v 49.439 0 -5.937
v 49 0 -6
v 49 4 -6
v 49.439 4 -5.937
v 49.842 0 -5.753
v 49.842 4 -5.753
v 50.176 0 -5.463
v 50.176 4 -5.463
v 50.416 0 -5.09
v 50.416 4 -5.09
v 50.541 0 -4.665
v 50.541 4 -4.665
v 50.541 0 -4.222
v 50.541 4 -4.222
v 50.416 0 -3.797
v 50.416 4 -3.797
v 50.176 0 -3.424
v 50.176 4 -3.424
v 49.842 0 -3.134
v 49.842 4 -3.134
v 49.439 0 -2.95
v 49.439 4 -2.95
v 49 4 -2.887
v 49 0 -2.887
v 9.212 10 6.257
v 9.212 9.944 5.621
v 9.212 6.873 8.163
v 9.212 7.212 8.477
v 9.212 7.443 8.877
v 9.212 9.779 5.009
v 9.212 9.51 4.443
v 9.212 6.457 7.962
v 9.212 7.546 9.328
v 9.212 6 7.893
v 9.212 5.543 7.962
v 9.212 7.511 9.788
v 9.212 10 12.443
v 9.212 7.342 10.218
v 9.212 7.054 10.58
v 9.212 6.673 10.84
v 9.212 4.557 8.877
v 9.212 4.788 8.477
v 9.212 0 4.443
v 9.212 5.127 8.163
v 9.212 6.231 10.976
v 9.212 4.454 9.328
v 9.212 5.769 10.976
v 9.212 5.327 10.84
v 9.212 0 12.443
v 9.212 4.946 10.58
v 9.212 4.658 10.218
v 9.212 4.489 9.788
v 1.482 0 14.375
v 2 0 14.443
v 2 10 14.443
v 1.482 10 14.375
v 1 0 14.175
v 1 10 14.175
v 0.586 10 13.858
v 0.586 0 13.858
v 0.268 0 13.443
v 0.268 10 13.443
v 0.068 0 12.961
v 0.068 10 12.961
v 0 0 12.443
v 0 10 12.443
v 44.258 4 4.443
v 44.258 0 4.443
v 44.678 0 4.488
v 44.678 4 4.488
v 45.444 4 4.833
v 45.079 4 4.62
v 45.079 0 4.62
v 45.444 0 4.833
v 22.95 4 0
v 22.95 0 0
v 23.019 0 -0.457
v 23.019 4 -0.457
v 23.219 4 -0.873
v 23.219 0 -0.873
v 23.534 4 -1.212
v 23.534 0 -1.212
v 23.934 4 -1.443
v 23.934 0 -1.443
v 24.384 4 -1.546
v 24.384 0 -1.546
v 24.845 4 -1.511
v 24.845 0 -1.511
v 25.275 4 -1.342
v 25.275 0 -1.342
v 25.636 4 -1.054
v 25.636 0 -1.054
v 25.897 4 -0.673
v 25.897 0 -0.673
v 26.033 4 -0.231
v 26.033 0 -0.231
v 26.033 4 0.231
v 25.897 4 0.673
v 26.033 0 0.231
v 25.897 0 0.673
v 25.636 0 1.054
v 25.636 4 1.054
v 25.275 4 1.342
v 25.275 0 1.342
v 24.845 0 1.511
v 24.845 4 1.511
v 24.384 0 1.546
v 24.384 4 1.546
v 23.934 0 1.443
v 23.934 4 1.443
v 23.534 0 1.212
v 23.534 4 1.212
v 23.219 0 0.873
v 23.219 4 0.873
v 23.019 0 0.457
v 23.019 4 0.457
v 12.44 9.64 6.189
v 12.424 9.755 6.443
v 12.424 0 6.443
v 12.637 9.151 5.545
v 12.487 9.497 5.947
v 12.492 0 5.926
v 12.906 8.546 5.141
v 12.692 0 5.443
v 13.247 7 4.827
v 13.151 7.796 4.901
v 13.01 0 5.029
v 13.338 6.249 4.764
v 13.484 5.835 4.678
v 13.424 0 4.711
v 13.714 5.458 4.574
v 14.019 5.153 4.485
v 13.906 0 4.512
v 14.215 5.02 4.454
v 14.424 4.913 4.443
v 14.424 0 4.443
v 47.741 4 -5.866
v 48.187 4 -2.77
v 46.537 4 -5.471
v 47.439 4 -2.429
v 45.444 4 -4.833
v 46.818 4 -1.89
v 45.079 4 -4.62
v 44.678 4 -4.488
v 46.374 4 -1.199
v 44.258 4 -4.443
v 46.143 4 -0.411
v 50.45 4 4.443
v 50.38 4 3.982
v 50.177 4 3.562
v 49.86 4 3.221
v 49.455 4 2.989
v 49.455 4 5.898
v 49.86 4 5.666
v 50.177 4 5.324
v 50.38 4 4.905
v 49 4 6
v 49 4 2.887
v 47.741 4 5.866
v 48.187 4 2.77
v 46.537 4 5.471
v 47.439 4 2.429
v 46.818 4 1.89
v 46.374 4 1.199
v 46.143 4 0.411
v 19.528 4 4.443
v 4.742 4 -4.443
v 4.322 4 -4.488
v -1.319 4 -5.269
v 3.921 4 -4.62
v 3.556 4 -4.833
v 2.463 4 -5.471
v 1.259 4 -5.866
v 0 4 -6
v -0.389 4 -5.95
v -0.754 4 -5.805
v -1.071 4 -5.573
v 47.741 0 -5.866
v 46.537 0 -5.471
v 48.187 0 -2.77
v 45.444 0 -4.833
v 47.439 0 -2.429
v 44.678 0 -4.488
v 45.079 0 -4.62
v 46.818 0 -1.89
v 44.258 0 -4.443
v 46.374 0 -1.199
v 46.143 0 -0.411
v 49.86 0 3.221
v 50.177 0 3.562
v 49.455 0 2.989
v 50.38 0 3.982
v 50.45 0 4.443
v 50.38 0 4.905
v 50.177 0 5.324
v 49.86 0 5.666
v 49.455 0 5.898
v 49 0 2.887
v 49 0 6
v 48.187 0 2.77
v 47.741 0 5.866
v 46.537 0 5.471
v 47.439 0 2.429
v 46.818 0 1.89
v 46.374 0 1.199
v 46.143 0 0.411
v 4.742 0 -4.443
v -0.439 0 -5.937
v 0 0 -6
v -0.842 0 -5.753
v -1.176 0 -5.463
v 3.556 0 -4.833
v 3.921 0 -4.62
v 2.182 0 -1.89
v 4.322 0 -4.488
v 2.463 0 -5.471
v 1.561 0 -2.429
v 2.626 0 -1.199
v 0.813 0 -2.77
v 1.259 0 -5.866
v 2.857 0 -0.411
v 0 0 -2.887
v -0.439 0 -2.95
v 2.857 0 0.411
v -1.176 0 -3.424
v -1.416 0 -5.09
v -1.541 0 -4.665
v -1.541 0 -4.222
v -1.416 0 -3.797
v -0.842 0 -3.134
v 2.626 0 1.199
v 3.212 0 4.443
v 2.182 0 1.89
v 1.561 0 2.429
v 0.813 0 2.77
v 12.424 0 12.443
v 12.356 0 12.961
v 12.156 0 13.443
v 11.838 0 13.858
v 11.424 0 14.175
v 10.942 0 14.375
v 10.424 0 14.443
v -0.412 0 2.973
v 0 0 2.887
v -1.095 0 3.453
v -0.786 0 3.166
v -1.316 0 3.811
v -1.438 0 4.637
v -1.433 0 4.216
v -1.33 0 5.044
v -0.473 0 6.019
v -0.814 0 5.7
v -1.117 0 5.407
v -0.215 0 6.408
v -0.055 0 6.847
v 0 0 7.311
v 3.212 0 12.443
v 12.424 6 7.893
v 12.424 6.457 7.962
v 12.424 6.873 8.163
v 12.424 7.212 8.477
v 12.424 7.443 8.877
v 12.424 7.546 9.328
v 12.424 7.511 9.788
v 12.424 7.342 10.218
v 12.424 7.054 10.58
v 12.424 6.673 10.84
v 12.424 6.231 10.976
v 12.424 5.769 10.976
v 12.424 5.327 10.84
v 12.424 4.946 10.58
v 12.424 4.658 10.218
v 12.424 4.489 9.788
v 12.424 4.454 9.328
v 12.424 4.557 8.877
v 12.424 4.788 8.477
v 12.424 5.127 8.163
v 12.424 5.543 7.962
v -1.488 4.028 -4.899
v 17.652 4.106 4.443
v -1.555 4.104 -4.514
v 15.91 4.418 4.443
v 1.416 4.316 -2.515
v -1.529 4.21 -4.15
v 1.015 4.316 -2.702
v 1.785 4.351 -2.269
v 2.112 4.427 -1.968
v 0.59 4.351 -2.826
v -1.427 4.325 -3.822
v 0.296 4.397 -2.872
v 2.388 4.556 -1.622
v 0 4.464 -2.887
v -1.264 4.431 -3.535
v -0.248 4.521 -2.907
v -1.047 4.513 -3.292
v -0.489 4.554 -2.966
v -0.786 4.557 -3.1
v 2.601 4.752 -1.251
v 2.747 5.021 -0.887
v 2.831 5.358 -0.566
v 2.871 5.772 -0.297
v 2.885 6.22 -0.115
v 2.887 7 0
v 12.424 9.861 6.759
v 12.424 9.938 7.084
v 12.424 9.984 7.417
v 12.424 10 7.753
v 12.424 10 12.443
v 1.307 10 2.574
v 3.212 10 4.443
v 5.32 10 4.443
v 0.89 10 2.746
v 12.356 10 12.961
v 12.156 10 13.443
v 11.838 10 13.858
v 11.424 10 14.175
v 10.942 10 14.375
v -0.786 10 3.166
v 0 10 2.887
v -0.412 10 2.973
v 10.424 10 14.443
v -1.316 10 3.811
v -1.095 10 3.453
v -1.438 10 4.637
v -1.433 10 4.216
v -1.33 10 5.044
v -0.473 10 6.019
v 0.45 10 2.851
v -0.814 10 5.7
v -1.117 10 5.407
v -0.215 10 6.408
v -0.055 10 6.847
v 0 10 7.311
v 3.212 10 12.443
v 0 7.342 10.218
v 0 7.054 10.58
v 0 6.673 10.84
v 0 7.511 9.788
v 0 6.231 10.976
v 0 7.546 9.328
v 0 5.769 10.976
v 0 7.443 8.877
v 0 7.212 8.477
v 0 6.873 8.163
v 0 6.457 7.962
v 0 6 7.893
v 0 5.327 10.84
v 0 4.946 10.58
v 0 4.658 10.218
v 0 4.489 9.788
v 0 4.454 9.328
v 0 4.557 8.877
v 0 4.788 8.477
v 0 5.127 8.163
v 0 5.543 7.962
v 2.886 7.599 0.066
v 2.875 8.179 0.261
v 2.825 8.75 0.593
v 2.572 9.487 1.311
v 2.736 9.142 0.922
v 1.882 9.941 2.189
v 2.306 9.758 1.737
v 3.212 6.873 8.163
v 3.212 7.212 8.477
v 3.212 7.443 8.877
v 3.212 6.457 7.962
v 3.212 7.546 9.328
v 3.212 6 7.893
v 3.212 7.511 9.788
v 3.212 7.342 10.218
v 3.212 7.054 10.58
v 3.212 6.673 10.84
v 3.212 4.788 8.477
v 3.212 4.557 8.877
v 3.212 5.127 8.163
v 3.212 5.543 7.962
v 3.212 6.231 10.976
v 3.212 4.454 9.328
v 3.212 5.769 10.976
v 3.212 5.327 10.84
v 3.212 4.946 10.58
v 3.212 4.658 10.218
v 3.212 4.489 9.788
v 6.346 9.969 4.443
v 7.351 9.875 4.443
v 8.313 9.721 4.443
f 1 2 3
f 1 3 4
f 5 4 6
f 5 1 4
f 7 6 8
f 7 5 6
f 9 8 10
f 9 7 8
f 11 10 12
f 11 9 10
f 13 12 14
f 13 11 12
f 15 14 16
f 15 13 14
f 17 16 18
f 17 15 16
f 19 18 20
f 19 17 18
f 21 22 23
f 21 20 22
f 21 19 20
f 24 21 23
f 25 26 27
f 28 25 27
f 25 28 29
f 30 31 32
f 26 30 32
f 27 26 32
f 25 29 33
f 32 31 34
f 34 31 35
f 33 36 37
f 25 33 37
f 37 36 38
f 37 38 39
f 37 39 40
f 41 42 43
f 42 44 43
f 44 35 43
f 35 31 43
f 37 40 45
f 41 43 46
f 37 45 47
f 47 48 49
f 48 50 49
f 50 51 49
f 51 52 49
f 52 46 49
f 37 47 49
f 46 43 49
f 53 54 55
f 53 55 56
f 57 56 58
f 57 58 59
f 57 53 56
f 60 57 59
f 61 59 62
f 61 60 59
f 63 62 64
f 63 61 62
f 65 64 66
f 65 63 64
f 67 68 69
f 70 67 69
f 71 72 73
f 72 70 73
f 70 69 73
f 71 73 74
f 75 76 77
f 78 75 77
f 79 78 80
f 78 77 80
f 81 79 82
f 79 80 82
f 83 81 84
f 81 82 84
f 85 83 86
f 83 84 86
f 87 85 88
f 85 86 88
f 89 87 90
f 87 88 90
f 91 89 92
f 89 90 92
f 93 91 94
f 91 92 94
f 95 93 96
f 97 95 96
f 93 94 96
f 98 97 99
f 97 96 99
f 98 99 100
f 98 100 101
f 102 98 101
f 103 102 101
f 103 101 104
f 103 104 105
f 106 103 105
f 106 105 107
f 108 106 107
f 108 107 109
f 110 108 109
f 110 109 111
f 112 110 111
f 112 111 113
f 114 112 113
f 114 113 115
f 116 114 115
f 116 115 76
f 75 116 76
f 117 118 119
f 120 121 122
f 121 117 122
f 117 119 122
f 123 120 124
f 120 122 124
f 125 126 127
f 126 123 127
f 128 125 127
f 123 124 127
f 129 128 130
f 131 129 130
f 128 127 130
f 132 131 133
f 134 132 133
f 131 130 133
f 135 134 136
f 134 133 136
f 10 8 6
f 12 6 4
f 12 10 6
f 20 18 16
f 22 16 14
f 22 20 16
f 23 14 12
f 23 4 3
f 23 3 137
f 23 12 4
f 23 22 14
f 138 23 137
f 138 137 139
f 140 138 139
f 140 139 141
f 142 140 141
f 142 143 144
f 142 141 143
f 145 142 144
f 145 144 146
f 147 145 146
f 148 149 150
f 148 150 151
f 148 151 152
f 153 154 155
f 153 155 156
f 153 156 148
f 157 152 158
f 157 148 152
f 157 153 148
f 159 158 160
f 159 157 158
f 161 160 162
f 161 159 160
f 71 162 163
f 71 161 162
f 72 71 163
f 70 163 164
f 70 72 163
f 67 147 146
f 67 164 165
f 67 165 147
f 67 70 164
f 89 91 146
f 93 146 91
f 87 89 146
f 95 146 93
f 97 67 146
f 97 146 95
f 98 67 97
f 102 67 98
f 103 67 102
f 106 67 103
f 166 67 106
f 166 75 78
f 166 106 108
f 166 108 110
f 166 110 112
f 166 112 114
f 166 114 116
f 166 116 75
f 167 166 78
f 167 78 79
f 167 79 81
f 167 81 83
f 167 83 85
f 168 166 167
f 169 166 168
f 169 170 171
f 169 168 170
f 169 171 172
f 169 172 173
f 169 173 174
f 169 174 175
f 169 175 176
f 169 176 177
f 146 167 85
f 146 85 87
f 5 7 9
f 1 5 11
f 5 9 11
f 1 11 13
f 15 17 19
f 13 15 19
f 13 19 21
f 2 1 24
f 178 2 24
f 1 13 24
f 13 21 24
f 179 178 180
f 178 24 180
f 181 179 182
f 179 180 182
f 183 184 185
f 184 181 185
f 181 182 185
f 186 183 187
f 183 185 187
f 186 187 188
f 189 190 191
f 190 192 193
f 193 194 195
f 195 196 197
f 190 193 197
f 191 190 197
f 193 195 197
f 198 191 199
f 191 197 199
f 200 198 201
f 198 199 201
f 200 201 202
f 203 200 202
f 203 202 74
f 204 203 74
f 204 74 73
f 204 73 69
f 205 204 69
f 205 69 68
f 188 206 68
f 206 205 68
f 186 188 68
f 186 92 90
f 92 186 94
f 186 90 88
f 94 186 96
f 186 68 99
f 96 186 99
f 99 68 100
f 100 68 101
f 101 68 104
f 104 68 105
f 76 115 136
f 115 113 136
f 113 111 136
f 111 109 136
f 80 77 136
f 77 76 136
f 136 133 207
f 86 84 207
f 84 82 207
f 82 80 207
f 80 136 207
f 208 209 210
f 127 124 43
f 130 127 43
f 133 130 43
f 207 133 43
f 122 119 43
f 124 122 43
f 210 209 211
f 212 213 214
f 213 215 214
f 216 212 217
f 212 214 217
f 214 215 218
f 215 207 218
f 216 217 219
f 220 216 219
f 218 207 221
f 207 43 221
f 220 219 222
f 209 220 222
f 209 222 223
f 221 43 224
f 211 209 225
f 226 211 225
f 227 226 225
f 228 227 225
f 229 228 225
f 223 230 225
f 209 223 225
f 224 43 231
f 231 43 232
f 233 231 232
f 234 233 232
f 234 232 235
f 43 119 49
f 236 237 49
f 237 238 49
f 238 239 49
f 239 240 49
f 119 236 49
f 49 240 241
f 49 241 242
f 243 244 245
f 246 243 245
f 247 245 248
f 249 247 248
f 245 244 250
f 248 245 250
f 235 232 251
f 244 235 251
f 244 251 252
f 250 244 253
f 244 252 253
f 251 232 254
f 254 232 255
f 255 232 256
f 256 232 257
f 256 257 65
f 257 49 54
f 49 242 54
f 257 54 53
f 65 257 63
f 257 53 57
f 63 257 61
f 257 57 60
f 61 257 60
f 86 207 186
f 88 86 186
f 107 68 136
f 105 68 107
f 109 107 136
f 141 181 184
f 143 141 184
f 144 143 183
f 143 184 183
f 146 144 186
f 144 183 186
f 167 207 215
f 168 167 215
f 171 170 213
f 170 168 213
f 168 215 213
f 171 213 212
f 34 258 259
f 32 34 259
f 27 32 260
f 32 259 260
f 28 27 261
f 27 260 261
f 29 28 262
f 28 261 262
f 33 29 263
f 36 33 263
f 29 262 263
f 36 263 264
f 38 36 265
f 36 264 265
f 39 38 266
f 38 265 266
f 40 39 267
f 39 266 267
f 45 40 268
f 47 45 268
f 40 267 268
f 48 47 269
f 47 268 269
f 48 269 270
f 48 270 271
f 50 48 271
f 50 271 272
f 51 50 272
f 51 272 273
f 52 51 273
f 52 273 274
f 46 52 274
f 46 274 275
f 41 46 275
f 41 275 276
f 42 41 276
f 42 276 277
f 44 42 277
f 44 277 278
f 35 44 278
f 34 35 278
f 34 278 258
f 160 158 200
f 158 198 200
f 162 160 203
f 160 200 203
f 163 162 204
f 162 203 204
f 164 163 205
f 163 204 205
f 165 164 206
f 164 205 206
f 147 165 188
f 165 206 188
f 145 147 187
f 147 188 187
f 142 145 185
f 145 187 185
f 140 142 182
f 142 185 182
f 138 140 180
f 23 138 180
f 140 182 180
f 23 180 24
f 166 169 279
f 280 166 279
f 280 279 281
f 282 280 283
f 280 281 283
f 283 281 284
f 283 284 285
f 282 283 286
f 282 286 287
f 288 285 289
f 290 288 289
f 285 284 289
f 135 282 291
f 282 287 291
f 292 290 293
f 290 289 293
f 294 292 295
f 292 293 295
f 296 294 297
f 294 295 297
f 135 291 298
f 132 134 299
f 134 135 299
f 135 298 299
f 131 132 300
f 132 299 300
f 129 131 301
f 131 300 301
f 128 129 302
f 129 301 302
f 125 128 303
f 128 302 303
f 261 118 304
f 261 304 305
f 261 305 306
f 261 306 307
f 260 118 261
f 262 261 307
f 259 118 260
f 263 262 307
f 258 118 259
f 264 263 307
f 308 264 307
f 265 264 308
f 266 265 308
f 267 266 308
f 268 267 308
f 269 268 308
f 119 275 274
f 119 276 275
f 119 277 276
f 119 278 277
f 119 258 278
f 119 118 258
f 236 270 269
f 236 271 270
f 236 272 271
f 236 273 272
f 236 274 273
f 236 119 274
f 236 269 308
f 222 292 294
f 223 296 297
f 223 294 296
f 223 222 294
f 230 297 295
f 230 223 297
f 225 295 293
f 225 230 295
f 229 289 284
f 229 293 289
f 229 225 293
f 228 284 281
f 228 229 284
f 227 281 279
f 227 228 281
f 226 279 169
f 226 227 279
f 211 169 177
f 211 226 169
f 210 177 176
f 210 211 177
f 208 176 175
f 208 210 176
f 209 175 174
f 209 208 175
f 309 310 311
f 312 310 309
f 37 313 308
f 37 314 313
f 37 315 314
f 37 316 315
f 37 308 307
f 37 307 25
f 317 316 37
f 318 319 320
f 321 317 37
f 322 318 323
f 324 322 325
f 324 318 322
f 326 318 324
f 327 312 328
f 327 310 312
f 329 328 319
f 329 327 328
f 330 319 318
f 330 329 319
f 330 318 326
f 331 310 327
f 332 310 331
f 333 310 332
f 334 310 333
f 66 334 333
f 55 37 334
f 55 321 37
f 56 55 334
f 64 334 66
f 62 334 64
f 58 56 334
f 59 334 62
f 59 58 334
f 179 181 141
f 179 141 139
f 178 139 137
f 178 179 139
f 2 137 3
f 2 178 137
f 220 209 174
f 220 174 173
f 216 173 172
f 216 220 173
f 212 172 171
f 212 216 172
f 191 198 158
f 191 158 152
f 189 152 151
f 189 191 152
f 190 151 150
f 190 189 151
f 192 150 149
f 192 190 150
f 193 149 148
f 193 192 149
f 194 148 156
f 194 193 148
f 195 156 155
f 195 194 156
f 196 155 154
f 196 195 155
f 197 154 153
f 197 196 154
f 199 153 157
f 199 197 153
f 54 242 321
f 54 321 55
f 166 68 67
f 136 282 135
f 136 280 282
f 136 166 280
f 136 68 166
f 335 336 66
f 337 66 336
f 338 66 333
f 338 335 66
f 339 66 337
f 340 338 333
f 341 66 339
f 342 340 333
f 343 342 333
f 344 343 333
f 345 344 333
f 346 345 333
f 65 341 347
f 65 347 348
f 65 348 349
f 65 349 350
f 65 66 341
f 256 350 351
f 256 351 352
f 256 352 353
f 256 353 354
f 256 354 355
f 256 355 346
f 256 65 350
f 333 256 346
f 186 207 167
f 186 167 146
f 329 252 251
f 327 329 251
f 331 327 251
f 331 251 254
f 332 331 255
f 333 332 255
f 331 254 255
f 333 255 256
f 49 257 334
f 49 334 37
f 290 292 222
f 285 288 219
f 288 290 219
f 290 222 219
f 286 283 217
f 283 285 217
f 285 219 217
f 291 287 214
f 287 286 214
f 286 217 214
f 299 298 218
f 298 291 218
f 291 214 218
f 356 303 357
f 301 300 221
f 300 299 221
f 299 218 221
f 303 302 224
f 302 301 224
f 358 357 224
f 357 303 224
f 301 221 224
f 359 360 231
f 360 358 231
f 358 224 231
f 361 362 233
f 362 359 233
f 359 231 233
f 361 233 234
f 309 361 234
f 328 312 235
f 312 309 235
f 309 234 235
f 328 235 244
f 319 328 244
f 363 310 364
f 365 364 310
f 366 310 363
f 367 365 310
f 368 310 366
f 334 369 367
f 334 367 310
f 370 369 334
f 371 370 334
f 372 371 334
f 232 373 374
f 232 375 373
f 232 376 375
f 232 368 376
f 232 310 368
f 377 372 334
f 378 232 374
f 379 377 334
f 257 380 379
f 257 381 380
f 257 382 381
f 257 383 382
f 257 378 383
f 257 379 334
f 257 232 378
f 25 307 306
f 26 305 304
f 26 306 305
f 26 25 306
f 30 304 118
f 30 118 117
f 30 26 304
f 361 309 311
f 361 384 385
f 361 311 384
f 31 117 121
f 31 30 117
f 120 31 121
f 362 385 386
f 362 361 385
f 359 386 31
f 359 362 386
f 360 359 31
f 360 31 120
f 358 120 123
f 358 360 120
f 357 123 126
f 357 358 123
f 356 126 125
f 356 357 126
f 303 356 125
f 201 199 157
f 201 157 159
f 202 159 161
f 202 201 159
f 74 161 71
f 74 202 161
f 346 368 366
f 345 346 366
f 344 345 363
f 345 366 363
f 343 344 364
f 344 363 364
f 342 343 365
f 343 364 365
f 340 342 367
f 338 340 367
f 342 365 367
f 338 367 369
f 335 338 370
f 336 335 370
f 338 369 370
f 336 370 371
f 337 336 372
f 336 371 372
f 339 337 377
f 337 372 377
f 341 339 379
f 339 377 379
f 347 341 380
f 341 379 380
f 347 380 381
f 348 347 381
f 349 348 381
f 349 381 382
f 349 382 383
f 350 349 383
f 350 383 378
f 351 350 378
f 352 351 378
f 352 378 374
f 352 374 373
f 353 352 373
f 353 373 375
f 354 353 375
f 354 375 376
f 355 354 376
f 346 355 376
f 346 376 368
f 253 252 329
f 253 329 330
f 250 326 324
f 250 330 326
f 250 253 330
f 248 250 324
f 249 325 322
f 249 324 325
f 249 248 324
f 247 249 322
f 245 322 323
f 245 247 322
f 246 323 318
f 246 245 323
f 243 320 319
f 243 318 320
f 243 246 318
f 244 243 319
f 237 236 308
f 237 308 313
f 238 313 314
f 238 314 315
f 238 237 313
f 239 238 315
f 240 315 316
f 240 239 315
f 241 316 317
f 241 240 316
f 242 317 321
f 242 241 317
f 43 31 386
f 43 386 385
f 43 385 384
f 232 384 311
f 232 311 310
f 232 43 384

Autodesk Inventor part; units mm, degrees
ref_plane "YZ Plane" through (0, 0, 0) normal (1, 0, 0) x (0, 1, 0)
ref_plane "XZ Plane" through (0, 0, 0) normal (0, 1, 0) x (-1, 0, 0)
ref_plane "XY Plane" through (0, 0, 0) normal (0, 0, 1) x (1, 0, 0)
sketch "Sketch1" plane through (0, 0, 0) normal (0, 1, 0) x (-1, 0, 0)
  circle A0 centre (0, 0) radius 2.4868
  line L0 (2.8868, 0) -> (1.4434, 2.5)
  line L1 (1.4434, 2.5) -> (-1.4434, 2.5)
  line L2 (-1.4434, 2.5) -> (-2.8868, 0)
  line L3 (-2.8868, 0) -> (-1.4434, -2.5)
  line L4 (-1.4434, -2.5) -> (1.4434, -2.5)
  line L5 (1.4434, -2.5) -> (2.8868, 0)
  line L6 (0, 0) -> (-23.467, 0)
  circle A1 centre (-49, 0) radius 2.4868
  line L7 (-46.1132, 0) -> (-47.5566, 2.5)
  line L8 (-47.5566, 2.5) -> (-50.4434, 2.5)
  line L9 (-50.4434, 2.5) -> (-51.8868, 0)
  line L10 (-51.8868, 0) -> (-50.4434, -2.5)
  line L11 (-50.4434, -2.5) -> (-47.5566, -2.5)
  line L12 (-47.5566, -2.5) -> (-46.1132, 0)
  arc A2 (43.788, 27) -> (35.788, 35) centre (35.788, 27) ccw
  line L13 (35.788, 35) -> (-48.212, 35)
  arc A3 (-48.212, 35) -> (-56.212, 27) centre (-48.212, 27) ccw
  line L14 (-56.212, 27) -> (-56.212, -62.0882)
  arc A4 (-56.212, -62.0882) -> (-54.3404, -67.2305) centre (-48.212, -62.0882) ccw
  line L15 (-54.3404, -67.2305) -> (-37.6324, -87.1423)
  arc A5 (-37.6324, -87.1423) -> (-31.504, -90) centre (-31.504, -82) ccw
  line L16 (-31.504, -90) -> (19.08, -90)
  arc A6 (19.08, -90) -> (25.2084, -87.1423) centre (19.08, -82) ccw
  line L17 (25.2084, -87.1423) -> (41.9164, -67.2305)
  arc A7 (41.9164, -67.2305) -> (43.788, -62.0882) centre (35.788, -62.0882) ccw
  line L18 (43.788, -62.0882) -> (43.788, 27)
  arc A8 (-17.212, -66) -> (-11.212, -72) centre (-11.212, -66) ccw
  line L19 (-11.212, -72) -> (-1.212, -72)
  arc A9 (-1.212, -72) -> (4.788, -66) centre (-1.212, -66) ccw
  line L20 (4.788, -66) -> (4.788, -64)
  arc A10 (10.788, -58) -> (4.788, -64) centre (10.788, -64) ccw
  line L21 (10.788, -58) -> (25.4731, -58)
  arc A11 (29.3447, -59.4162) -> (25.4731, -58) centre (25.4731, -64) ccw
  line L22 (29.3447, -59.4162) -> (31.3866, -61.1409)
  arc A12 (32.1113, -69.5814) -> (31.3866, -61.1409) centre (27.515, -65.7247) ccw
  line L23 (32.1113, -69.5814) -> (21.8111, -81.8567)
  arc A13 (17.2148, -84) -> (21.8111, -81.8567) centre (17.2148, -78) ccw
  line L24 (17.2148, -84) -> (-29.6388, -84)
  arc A14 (-34.2351, -81.8567) -> (-29.6388, -84) centre (-29.6388, -78) ccw
  line L25 (-34.2351, -81.8567) -> (-44.5353, -69.5814)
  arc A15 (-43.8106, -61.1409) -> (-44.5353, -69.5814) centre (-39.939, -65.7247) ccw
  line L26 (-43.8106, -61.1409) -> (-41.7687, -59.4162)
  arc A16 (-37.8971, -58) -> (-41.7687, -59.4162) centre (-37.8971, -64) ccw
  line L27 (-37.8971, -58) -> (-23.212, -58)
  arc A17 (-17.212, -64) -> (-23.212, -58) centre (-23.212, -64) ccw
  line L28 (-17.212, -64) -> (-17.212, -66)
  circle A18 centre (0, -58) radius 1.375
  circle A19 centre (0, 0) radius 1.5
  circle A20 centre (-49, -58) radius 1.375
  circle A21 centre (-51.962, 9) radius 0.575
  circle A22 centre (39.538, 27) radius 0.575
  circle A23 centre (39.538, 9) radius 0.575
  circle A24 centre (36.576, 0) radius 1.5
  circle A25 centre (36.576, -43.18) radius 1.5
  circle A26 centre (0, -43.18) radius 1.5
  circle A27 centre (-49, 0) radius 1.375
  circle A28 centre (-51.962, 27) radius 0.575
  circle A29 centre (-6.212, -53.538) radius 1.15
  circle A30 centre (-6.212, -67) radius 1.15
  line L29 (35.788, 35) -> (-48.212, 35)
  line L30 (-6.212, 35) -> (-6.212, -103.5846)
  dimension "d2" = 49
sketch "Sketch2" plane through (0, 0, 0) normal (0, 1, 0) x (-1, 0, 0)
  line L0 (-2.8868, 0) -> (-1.4434, -2.5) projected
  line L1 (1.4434, -2.5) -> (2.8868, 0) projected
  circle A0 centre (0, 0) radius 2.8868
  circle A1 centre (0, 0) radius 6
  arc A2 (0, -6) -> (0, -2.8868) centre (0, -4.4434) ccw
  arc A3 (0, 2.8868) -> (0, 6) centre (-0.1105, 4.4434) ccw
  line L2 (0, -4.4434) -> (-24.5, -4.4434)
  line L3 (-24.5, -4.4434) -> (-24.5, 4.4434)
  line L4 (-24.5, 4.4434) -> (0, 4.4434)
  line L5 (0, 4.4434) -> (0, -4.4434)
  line L6 (-46.1132, 0) -> (-47.5566, -2.5)
  line L7 (-50.4434, -2.5) -> (-51.8868, 0)
  circle A4 centre (-49, 0) radius 2.8868
  circle A5 centre (-49, 0) radius 6
  arc A6 (-49, -2.8868) -> (-49, -6) centre (-49, -4.4434) ccw
  arc A7 (-49, 6) -> (-49, 2.8868) centre (-48.8895, 4.4434) ccw
  line L8 (-49, -4.4434) -> (-24.5, -4.4434)
  line L9 (-24.5, 4.4434) -> (-49, 4.4434)
  line L10 (-49, 4.4434) -> (-49, -4.4434)
  circle A8 centre (-24.5, 0) radius 1.55
  line L11 (-6.212, 35) -> (-6.212, -103.5846) projected
  line L12 (0, 4.4434) -> (-12.424, 4.4434)
  line L13 (-12.424, 4.4434) -> (-12.424, 14.4434)
  line L14 (-12.424, 14.4434) -> (0, 14.4434)
  line L15 (0, 14.4434) -> (0, 4.4434)
  line L16 (-12.424, 4.4434) -> (-2.8868, 4.4434)
  line L17 (-2.8868, 4.4434) -> (-2.8868, 0)
  line L18 (-2.8868, 0) -> (-12.424, 0)
  line L19 (-12.424, 0) -> (-12.424, 4.4434)
  line L20 (-6.212, 4.4434) -> (-3.212, 4.4434)
  line L21 (-3.212, 4.4434) -> (-3.212, 12.4434)
  line L22 (-3.212, 12.4434) -> (-6.212, 12.4434)
  line L23 (-6.212, 12.4434) -> (-6.212, 4.4434)
  line L24 (-6.212, 4.4434) -> (-9.212, 4.4434)
  line L25 (-9.212, 4.4434) -> (-9.212, 12.4434)
  line L26 (-9.212, 12.4434) -> (-6.212, 12.4434)
  line L27 (-12.424, 4.4434) -> (-2.8868, 0)
  point P0 (0, 0)
  point P1 (-4.0319, -4.4434)
  point P2 (-4.0319, 4.4434)
  point P3 (-44.9681, 4.4434)
  point P4 (-44.9681, -4.4434)
  point P5 (0, 6)
  point P6 (0, 6)
  point P7 (-9.5372, 4.4434)
  point P8 (-3.212, 5.0678)
  dimension "d7" = 12
  dimension "d9" = 3.1
  dimension "d14" = 12.424
  dimension "d15" = 10
  dimension "d16" = 6.212
  dimension "d24" = 3
  dimension "d25" = 8
extrude "Extrusion1" add sketch "Sketch2" along normal blind 4 contours L17 L4 L5 A0 | L27 A1 L4 L17 | A0 L5 L2 A1 L18 | L18 A1 L27 | L5 L15 A3 | L4 L21 A1 L15 | L18 L11 L27 A1 | A1 L2 L11 L18 | L27 L11 L4 A1 | A2 A1 L2 L5 | L18 L19 L27 L11 | L11 L2 L3 A8 L4 L19 L18 | L27 L4 L11 | L8 A5 L9 L3 A8 | L8 L10 A4 L9 A5 | A5 A6 L10 L8 | L9 L10 A7 A5
extrude "Extrusion3" add sketch "Sketch2" along normal blind 10 contours L17 L4 L5 A0 | L27 A1 L4 L17 | L5 L15 A3 | L4 L21 A1 L15 | L27 L11 L4 A1 | A1 L21 L22 L11 L14 L15 | L27 L4 L11 | L13 L14 L11 L26 L25 L4
sketch "Sketch4" plane through (12.424, 0, 14.4434) normal (1, 0, 0) x (0, 0, -1)
  line L0 (2, 0) -> (2, 10) projected
  line L1 (2, 10) -> (10, 10)
  line L2 (10, 10) -> (10, 0)
  line L3 (10, 0) -> (2, 0)
  line L4 (2, 0) -> (2, 10)
  circle A0 centre (5, 6) radius 1.55
  point P0 (14.4434, 0)
  dimension "d26" = 8
  dimension "d27" = 3.1
  dimension "d28" = 4
  dimension "d31" = 3
extrude "Extrusion4" cut sketch "Sketch4" against normal up to surface (12.424 mm away) contours A0
fillet "Fillet3" radius 3 2 edges at (7.6554, 4, 2.2217) (7.6554, 10, 2.2217)
fillet "Fillet3" radius 2 7 edges at (12.424, 2, 4.4434) (12.424, 5, 14.4434) (0, 5, 14.4434) (44.9681, 2, 4.4434) (44.9681, 2, -4.4434) (4.0319, 2, -4.4434) (0, 5, 6)
equation "\"d14\" = 2 * d16"
equation "\"d24\" = Acrylic"
equation "\"Acrylic\" = 3"
properties part number "BaseMount"
